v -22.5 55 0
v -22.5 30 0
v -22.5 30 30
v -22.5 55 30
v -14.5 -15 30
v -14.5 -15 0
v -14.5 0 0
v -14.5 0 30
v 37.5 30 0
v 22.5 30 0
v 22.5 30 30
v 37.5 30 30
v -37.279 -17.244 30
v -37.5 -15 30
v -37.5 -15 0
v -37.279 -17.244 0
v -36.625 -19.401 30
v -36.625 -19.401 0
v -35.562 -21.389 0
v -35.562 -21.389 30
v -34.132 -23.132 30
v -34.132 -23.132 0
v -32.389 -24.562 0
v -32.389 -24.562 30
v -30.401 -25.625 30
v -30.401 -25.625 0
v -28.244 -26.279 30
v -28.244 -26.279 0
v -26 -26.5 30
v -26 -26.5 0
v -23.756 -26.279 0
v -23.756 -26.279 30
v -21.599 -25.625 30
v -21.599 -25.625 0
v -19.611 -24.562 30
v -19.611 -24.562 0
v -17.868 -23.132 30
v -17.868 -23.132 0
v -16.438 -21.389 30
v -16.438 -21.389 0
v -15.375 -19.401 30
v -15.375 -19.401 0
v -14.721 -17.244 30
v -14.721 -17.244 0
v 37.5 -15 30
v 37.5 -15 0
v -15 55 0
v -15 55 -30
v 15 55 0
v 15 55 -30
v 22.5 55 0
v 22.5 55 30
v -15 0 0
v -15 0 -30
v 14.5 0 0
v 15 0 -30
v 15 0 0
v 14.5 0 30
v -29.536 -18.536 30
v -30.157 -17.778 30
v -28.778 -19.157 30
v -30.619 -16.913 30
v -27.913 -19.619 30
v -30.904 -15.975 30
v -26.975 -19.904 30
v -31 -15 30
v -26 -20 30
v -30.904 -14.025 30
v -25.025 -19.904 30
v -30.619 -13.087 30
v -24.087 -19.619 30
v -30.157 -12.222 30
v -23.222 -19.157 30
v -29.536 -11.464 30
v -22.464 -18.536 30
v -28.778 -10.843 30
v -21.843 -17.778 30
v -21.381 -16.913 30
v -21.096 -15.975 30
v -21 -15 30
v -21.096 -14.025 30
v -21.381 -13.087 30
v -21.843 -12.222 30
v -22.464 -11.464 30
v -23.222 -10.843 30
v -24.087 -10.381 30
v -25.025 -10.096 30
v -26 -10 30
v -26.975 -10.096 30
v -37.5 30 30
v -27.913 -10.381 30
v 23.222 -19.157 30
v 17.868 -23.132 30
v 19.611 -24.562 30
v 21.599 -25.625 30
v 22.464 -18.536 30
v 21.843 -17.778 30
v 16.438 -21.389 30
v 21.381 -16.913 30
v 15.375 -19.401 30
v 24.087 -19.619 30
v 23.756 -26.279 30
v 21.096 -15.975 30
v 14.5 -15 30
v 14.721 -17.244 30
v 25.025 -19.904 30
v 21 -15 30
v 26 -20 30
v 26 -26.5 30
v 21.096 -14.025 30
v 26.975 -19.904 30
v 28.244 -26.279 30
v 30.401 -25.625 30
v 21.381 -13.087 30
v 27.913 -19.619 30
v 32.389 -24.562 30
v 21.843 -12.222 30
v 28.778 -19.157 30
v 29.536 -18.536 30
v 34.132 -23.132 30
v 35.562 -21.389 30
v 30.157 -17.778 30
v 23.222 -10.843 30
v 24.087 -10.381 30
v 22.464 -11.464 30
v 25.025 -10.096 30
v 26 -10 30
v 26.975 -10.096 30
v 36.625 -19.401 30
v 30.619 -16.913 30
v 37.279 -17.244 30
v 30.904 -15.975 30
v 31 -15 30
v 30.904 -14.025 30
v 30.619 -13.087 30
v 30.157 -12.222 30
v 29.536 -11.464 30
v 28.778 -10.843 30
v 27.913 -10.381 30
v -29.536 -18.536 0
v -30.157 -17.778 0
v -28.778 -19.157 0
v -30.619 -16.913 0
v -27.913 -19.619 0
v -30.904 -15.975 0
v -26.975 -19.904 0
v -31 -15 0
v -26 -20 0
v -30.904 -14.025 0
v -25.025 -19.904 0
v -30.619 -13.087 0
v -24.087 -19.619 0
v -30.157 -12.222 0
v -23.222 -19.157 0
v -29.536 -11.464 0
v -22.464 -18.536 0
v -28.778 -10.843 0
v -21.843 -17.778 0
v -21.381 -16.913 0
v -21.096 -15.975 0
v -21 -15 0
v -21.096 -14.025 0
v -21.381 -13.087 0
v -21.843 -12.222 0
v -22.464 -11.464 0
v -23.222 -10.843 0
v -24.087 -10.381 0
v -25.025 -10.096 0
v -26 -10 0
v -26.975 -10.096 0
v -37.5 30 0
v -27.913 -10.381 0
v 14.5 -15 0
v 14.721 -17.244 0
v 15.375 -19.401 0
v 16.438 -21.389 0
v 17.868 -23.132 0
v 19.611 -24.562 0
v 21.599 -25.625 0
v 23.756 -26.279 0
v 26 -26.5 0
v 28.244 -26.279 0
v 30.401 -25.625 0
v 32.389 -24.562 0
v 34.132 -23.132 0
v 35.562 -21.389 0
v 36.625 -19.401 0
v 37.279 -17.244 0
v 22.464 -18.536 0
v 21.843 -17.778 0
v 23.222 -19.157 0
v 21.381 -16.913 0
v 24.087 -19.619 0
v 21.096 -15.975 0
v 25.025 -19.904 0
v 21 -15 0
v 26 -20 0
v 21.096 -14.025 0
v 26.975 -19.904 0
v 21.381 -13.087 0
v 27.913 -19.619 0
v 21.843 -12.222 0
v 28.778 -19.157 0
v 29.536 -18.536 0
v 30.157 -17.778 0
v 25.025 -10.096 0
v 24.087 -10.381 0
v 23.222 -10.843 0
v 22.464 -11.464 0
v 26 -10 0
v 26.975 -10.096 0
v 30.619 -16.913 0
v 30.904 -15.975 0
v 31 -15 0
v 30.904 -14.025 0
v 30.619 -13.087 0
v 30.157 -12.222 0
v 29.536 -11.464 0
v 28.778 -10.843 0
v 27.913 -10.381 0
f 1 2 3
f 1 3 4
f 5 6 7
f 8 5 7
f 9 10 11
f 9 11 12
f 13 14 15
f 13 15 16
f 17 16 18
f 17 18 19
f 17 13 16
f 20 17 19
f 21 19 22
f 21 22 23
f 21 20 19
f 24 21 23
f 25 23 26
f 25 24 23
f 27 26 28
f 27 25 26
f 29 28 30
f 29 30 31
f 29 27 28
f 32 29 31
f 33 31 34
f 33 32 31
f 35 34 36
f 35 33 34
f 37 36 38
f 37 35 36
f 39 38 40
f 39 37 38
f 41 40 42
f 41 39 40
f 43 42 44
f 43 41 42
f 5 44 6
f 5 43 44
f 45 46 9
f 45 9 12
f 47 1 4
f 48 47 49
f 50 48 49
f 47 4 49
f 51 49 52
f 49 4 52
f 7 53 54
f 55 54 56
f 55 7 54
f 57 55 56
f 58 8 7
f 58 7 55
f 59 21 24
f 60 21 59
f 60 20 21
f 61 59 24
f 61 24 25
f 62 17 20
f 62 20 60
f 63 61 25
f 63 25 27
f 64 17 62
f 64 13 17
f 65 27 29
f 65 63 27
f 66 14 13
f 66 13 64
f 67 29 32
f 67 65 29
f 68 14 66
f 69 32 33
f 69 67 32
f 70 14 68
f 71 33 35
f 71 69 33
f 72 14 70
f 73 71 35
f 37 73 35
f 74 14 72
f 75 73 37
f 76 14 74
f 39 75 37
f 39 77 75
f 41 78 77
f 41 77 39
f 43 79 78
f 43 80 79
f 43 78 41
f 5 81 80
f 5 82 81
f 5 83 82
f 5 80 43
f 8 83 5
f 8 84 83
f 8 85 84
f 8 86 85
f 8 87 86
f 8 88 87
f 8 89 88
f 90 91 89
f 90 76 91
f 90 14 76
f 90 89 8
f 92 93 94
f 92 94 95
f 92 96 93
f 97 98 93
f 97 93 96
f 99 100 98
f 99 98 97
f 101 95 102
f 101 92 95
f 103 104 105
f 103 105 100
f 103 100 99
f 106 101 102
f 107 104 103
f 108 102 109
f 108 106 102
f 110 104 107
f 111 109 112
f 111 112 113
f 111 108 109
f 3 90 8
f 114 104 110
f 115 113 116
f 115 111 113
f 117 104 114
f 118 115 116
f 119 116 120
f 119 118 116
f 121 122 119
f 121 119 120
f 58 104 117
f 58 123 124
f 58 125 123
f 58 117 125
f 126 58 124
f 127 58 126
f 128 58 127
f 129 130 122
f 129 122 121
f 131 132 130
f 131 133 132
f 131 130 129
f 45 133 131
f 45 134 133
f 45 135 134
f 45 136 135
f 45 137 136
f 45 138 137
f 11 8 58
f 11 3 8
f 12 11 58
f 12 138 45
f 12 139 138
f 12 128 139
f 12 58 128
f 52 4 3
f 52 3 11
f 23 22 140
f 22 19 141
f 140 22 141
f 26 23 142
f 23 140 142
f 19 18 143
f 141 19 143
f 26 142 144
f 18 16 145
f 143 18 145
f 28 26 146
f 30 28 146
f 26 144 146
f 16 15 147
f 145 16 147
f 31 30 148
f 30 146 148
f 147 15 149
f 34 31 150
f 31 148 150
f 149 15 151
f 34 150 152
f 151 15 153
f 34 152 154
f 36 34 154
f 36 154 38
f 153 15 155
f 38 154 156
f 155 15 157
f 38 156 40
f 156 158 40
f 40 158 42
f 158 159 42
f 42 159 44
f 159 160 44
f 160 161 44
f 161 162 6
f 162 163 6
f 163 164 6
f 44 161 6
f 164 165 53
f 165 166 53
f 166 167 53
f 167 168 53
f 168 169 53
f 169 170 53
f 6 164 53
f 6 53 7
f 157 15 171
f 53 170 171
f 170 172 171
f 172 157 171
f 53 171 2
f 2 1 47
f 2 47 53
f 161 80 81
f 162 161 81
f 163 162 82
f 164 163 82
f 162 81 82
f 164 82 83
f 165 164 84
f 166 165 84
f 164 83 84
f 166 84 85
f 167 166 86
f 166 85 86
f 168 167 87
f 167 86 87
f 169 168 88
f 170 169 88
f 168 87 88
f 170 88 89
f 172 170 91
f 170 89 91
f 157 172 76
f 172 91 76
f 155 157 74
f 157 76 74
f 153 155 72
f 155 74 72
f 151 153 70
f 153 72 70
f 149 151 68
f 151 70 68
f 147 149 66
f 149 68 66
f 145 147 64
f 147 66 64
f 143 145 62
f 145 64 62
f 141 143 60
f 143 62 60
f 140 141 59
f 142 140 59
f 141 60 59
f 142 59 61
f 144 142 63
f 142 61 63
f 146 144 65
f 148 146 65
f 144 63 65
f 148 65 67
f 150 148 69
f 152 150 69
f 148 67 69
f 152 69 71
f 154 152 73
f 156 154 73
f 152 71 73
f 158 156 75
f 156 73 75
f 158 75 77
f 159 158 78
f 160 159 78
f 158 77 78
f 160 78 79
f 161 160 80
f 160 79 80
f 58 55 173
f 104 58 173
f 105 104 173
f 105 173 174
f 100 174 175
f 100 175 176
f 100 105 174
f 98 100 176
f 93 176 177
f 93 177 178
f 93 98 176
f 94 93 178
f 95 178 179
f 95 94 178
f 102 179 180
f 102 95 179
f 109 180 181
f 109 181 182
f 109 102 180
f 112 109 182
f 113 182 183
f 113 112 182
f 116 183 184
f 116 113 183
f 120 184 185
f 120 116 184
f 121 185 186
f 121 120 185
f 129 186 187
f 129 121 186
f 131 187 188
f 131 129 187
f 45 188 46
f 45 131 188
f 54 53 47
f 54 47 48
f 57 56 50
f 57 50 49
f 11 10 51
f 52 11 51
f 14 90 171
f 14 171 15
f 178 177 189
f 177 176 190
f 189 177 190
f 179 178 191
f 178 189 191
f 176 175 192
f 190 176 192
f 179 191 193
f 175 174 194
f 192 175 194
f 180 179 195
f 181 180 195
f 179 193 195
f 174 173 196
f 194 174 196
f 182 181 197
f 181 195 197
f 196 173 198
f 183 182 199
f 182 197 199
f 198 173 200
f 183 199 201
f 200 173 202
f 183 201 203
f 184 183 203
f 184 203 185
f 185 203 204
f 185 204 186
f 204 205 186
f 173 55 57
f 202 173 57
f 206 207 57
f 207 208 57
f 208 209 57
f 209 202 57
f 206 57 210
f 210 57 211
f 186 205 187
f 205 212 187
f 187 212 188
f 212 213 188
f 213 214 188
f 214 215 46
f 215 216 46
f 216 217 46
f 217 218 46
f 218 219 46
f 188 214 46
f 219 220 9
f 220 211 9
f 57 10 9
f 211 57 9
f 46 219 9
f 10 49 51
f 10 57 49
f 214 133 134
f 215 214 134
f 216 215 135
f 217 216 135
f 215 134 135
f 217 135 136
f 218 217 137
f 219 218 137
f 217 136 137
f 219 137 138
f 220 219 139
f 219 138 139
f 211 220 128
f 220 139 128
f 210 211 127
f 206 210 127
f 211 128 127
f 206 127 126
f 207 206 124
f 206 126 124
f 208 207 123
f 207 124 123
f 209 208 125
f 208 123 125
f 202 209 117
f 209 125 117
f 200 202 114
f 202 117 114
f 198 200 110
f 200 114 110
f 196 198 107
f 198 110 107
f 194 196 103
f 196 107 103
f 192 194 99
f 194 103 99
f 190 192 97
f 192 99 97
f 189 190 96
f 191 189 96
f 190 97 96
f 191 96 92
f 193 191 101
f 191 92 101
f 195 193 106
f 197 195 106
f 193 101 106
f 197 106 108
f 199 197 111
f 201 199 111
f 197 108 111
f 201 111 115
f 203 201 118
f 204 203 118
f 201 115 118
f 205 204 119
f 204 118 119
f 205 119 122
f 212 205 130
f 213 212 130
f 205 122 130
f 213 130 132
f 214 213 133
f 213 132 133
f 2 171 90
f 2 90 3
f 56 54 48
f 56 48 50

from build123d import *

# Parameters (mm, degrees)
F1_DEPTH = 55
F2_W     = 15
F2_H     = 25
F3_DEPTH = 57.6
F4_R     = 5
F5_DEPTH = 30


with BuildPart() as f1:
    # F0 (on Front) → F1 (new body)
    with BuildSketch(Plane.XZ):
        Polygon((-37.5, 30), (-37.5, 0), (-15, 0), (-15, -30), (0, -30), (15, -30), (15, 0), (37.5, 0), (37.5, 30), (0, 30), align=None)
    extrude(amount=-F1_DEPTH)

    # F2 (on face) → F3 (cut)
    with BuildSketch(Plane.XY.offset(30)):
        with Locations((-30, 42.5)):
            Rectangle(F2_W, F2_H)
        with Locations((30, 42.5)):
            Rectangle(F2_W, F2_H)
    extrude(amount=-F3_DEPTH, mode=Mode.SUBTRACT)

    # F4 (on face) → F5 (join)
    with BuildSketch(Plane.XY.offset(30)):
        with BuildLine():
            Line((-14.5, 0), (-37.5, 0))
            Line((-37.5, 0), (-37.5, -15))
            ThreePointArc((-37.5, -15), (-26, -26.5), (-14.5, -15))
            Line((-14.5, -15), (-14.5, 0))
        make_face()
        with Locations((-26, -15)):
            Circle(F4_R, mode=Mode.SUBTRACT)
        with BuildLine():
            Line((37.5, 0), (14.5, 0))
            Line((14.5, 0), (14.5, -15))
            ThreePointArc((14.5, -15), (26, -26.5), (37.5, -15))
            Line((37.5, -15), (37.5, 0))
        make_face()
        with Locations((26, -15)):
            Circle(F4_R, mode=Mode.SUBTRACT)
    extrude(amount=-F5_DEPTH)


solid = f1.part
